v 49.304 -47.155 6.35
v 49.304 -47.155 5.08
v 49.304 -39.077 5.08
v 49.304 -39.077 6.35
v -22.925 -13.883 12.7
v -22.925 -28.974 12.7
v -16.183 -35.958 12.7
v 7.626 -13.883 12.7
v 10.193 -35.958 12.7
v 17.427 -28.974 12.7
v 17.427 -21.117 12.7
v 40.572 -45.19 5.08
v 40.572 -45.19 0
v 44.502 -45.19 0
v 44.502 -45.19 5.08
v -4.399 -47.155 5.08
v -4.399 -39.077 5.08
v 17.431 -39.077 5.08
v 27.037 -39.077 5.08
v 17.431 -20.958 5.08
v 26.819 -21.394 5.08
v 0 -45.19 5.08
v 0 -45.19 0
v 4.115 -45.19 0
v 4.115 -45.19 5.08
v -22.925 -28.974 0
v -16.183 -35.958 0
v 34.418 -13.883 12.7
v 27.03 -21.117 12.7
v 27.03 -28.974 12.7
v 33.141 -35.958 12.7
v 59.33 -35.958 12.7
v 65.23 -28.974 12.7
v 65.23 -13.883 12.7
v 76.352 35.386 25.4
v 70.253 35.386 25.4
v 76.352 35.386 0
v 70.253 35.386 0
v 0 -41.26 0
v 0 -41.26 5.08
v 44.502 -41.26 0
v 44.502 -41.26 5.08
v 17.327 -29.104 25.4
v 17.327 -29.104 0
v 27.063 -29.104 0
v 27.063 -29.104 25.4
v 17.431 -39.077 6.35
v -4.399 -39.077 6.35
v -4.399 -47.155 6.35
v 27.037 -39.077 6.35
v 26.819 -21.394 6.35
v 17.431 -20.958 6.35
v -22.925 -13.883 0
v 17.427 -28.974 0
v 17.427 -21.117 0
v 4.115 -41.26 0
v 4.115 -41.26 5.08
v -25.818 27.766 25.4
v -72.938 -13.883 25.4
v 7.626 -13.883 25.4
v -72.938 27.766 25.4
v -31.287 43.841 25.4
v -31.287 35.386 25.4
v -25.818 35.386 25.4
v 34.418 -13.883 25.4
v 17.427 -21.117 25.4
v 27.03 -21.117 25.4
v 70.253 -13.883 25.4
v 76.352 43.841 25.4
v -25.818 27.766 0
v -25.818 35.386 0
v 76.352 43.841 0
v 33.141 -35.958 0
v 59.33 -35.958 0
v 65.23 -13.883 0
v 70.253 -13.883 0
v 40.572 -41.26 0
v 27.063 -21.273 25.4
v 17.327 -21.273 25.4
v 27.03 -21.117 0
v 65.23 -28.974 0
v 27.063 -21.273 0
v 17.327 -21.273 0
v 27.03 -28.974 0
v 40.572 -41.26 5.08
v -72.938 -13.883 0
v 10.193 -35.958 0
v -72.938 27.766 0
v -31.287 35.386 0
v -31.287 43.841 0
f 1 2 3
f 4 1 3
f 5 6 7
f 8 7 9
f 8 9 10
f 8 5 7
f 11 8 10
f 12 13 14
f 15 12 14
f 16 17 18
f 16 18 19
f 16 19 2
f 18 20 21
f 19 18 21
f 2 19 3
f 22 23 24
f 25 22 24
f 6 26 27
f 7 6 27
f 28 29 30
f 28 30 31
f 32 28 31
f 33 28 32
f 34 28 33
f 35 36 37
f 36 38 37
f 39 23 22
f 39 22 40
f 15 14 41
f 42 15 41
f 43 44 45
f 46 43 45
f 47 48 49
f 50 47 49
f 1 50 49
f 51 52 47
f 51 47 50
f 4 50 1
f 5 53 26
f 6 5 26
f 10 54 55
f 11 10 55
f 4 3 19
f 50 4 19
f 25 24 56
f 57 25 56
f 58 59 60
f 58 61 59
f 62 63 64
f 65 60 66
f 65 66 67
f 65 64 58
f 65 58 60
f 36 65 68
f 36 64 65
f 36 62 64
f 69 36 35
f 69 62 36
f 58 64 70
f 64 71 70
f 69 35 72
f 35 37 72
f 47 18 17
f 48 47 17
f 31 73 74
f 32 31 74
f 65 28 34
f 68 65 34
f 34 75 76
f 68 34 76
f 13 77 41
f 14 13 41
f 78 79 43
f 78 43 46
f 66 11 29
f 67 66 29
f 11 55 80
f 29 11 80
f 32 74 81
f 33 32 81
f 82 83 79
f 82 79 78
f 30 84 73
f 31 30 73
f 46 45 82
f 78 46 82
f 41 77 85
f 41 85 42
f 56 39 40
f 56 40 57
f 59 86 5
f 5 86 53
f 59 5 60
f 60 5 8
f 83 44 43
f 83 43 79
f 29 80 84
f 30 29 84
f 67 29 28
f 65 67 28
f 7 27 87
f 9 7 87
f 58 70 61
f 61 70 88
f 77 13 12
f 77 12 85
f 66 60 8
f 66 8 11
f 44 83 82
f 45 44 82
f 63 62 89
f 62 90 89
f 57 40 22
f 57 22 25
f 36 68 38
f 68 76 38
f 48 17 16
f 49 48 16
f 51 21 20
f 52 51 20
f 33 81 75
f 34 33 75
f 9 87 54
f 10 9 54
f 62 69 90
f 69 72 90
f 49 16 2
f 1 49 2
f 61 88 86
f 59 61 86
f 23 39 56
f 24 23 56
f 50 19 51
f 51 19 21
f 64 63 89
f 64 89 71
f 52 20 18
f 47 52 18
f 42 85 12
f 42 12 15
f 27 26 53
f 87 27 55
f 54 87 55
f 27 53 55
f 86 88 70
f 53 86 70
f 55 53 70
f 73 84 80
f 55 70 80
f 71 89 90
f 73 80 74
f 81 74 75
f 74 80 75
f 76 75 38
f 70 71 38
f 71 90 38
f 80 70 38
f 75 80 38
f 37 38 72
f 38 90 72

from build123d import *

# Parameters (mm, degrees)
F1_DEPTH = 12.7
F3_DEPTH = 12.7
F4_W     = 4.114597
F4_H     = 3.929552
F4_W_2   = 3.929552
F5_DEPTH = 5.08
F7_DEPTH = 1.27
F8_W     = 9.736664
F8_H     = 7.831667
F9_DEPTH = 25.4


with BuildPart() as f1:
    # F0 (on Top) → F1 (new body)
    with BuildSketch(Plane.XY):
        Polygon((-25.817534, 27.766027), (-72.938435, 27.766027), (-72.938435, -13.883014), (-22.924972, -13.883014), (10.443441, -13.883014), (33.140998, -13.883014), (65.230117, -13.883014), (70.253134, -13.883014), (70.253134, 27.766027), align=None)
        Polygon((-25.817534, 35.386027), (-25.817534, 27.766027), (70.253134, 27.766027), (70.253134, 35.386027), (76.351784, 35.386027), (76.351784, 43.841098), (-31.286752, 43.841098), (-31.286752, 35.386027), align=None)
        Polygon((10.443441, -13.883014), (-22.924972, -13.883014), (-22.924972, -28.973805), (-16.182542, -35.957668), (10.193365, -35.957668), (17.427307, -28.973805), (17.427307, -21.116959), align=None)
        Polygon((33.140998, -13.883014), (10.443441, -13.883014), (17.427307, -21.116959), (27.030118, -21.116959), align=None)
        Polygon((65.230117, -28.973805), (65.230117, -13.883014), (33.140998, -13.883014), (27.030118, -21.116959), (27.030118, -28.973805), (33.140998, -35.957668), (59.330493, -35.957668), align=None)
    extrude(amount=F1_DEPTH)

    # F2 (on face) → F3 (join)
    with BuildSketch(Plane.XY.offset(12.7)):
        Polygon((-72.938435, -13.883014), (-22.924972, -13.883014), (7.626304, -13.883014), (17.427307, -21.116959), (27.030118, -21.116959), (34.418084, -13.883014), (65.230117, -13.883014), (70.253134, -13.883014), (70.253134, 35.386027), (76.351784, 35.386027), (76.351784, 43.841098), (-31.286752, 43.841098), (-31.286752, 35.386027), (-25.817534, 35.386027), (-25.817534, 27.766027), (-72.938435, 27.766027), align=None)
    extrude(amount=F3_DEPTH)


with BuildPart() as f5:
    # F4 (on Top) → F5 (new body)
    with BuildSketch(Plane.XY):
        with Locations((2.057298, -43.225048)):
            Rectangle(F4_W, F4_H)
        with Locations((42.53686, -43.225048)):
            Rectangle(F4_W_2, F4_H)
    extrude(amount=F5_DEPTH)


with BuildPart() as f7:
    # F6 (on face) → F7 (new body)
    with BuildSketch(Plane.XY.offset(5.08)):
        Polygon((26.818659, -21.394216), (17.431403, -20.957598), (17.431403, -37.330724), (17.431403, -39.077189), (-4.39943, -39.077189), (-4.39943, -47.154598), (49.304418, -47.154598), (49.304418, -39.077189), (27.03697, -39.077189), align=None)
    extrude(amount=F7_DEPTH)


with BuildPart() as f9:
    # F8 (on Top) → F9 (new body)
    with BuildSketch(Plane.XY):
        with Locations((22.195058, -25.188334)):
            Rectangle(F8_W, F8_H)
    extrude(amount=F9_DEPTH)


solid = Compound([f1.part, f5.part, f7.part, f9.part])
